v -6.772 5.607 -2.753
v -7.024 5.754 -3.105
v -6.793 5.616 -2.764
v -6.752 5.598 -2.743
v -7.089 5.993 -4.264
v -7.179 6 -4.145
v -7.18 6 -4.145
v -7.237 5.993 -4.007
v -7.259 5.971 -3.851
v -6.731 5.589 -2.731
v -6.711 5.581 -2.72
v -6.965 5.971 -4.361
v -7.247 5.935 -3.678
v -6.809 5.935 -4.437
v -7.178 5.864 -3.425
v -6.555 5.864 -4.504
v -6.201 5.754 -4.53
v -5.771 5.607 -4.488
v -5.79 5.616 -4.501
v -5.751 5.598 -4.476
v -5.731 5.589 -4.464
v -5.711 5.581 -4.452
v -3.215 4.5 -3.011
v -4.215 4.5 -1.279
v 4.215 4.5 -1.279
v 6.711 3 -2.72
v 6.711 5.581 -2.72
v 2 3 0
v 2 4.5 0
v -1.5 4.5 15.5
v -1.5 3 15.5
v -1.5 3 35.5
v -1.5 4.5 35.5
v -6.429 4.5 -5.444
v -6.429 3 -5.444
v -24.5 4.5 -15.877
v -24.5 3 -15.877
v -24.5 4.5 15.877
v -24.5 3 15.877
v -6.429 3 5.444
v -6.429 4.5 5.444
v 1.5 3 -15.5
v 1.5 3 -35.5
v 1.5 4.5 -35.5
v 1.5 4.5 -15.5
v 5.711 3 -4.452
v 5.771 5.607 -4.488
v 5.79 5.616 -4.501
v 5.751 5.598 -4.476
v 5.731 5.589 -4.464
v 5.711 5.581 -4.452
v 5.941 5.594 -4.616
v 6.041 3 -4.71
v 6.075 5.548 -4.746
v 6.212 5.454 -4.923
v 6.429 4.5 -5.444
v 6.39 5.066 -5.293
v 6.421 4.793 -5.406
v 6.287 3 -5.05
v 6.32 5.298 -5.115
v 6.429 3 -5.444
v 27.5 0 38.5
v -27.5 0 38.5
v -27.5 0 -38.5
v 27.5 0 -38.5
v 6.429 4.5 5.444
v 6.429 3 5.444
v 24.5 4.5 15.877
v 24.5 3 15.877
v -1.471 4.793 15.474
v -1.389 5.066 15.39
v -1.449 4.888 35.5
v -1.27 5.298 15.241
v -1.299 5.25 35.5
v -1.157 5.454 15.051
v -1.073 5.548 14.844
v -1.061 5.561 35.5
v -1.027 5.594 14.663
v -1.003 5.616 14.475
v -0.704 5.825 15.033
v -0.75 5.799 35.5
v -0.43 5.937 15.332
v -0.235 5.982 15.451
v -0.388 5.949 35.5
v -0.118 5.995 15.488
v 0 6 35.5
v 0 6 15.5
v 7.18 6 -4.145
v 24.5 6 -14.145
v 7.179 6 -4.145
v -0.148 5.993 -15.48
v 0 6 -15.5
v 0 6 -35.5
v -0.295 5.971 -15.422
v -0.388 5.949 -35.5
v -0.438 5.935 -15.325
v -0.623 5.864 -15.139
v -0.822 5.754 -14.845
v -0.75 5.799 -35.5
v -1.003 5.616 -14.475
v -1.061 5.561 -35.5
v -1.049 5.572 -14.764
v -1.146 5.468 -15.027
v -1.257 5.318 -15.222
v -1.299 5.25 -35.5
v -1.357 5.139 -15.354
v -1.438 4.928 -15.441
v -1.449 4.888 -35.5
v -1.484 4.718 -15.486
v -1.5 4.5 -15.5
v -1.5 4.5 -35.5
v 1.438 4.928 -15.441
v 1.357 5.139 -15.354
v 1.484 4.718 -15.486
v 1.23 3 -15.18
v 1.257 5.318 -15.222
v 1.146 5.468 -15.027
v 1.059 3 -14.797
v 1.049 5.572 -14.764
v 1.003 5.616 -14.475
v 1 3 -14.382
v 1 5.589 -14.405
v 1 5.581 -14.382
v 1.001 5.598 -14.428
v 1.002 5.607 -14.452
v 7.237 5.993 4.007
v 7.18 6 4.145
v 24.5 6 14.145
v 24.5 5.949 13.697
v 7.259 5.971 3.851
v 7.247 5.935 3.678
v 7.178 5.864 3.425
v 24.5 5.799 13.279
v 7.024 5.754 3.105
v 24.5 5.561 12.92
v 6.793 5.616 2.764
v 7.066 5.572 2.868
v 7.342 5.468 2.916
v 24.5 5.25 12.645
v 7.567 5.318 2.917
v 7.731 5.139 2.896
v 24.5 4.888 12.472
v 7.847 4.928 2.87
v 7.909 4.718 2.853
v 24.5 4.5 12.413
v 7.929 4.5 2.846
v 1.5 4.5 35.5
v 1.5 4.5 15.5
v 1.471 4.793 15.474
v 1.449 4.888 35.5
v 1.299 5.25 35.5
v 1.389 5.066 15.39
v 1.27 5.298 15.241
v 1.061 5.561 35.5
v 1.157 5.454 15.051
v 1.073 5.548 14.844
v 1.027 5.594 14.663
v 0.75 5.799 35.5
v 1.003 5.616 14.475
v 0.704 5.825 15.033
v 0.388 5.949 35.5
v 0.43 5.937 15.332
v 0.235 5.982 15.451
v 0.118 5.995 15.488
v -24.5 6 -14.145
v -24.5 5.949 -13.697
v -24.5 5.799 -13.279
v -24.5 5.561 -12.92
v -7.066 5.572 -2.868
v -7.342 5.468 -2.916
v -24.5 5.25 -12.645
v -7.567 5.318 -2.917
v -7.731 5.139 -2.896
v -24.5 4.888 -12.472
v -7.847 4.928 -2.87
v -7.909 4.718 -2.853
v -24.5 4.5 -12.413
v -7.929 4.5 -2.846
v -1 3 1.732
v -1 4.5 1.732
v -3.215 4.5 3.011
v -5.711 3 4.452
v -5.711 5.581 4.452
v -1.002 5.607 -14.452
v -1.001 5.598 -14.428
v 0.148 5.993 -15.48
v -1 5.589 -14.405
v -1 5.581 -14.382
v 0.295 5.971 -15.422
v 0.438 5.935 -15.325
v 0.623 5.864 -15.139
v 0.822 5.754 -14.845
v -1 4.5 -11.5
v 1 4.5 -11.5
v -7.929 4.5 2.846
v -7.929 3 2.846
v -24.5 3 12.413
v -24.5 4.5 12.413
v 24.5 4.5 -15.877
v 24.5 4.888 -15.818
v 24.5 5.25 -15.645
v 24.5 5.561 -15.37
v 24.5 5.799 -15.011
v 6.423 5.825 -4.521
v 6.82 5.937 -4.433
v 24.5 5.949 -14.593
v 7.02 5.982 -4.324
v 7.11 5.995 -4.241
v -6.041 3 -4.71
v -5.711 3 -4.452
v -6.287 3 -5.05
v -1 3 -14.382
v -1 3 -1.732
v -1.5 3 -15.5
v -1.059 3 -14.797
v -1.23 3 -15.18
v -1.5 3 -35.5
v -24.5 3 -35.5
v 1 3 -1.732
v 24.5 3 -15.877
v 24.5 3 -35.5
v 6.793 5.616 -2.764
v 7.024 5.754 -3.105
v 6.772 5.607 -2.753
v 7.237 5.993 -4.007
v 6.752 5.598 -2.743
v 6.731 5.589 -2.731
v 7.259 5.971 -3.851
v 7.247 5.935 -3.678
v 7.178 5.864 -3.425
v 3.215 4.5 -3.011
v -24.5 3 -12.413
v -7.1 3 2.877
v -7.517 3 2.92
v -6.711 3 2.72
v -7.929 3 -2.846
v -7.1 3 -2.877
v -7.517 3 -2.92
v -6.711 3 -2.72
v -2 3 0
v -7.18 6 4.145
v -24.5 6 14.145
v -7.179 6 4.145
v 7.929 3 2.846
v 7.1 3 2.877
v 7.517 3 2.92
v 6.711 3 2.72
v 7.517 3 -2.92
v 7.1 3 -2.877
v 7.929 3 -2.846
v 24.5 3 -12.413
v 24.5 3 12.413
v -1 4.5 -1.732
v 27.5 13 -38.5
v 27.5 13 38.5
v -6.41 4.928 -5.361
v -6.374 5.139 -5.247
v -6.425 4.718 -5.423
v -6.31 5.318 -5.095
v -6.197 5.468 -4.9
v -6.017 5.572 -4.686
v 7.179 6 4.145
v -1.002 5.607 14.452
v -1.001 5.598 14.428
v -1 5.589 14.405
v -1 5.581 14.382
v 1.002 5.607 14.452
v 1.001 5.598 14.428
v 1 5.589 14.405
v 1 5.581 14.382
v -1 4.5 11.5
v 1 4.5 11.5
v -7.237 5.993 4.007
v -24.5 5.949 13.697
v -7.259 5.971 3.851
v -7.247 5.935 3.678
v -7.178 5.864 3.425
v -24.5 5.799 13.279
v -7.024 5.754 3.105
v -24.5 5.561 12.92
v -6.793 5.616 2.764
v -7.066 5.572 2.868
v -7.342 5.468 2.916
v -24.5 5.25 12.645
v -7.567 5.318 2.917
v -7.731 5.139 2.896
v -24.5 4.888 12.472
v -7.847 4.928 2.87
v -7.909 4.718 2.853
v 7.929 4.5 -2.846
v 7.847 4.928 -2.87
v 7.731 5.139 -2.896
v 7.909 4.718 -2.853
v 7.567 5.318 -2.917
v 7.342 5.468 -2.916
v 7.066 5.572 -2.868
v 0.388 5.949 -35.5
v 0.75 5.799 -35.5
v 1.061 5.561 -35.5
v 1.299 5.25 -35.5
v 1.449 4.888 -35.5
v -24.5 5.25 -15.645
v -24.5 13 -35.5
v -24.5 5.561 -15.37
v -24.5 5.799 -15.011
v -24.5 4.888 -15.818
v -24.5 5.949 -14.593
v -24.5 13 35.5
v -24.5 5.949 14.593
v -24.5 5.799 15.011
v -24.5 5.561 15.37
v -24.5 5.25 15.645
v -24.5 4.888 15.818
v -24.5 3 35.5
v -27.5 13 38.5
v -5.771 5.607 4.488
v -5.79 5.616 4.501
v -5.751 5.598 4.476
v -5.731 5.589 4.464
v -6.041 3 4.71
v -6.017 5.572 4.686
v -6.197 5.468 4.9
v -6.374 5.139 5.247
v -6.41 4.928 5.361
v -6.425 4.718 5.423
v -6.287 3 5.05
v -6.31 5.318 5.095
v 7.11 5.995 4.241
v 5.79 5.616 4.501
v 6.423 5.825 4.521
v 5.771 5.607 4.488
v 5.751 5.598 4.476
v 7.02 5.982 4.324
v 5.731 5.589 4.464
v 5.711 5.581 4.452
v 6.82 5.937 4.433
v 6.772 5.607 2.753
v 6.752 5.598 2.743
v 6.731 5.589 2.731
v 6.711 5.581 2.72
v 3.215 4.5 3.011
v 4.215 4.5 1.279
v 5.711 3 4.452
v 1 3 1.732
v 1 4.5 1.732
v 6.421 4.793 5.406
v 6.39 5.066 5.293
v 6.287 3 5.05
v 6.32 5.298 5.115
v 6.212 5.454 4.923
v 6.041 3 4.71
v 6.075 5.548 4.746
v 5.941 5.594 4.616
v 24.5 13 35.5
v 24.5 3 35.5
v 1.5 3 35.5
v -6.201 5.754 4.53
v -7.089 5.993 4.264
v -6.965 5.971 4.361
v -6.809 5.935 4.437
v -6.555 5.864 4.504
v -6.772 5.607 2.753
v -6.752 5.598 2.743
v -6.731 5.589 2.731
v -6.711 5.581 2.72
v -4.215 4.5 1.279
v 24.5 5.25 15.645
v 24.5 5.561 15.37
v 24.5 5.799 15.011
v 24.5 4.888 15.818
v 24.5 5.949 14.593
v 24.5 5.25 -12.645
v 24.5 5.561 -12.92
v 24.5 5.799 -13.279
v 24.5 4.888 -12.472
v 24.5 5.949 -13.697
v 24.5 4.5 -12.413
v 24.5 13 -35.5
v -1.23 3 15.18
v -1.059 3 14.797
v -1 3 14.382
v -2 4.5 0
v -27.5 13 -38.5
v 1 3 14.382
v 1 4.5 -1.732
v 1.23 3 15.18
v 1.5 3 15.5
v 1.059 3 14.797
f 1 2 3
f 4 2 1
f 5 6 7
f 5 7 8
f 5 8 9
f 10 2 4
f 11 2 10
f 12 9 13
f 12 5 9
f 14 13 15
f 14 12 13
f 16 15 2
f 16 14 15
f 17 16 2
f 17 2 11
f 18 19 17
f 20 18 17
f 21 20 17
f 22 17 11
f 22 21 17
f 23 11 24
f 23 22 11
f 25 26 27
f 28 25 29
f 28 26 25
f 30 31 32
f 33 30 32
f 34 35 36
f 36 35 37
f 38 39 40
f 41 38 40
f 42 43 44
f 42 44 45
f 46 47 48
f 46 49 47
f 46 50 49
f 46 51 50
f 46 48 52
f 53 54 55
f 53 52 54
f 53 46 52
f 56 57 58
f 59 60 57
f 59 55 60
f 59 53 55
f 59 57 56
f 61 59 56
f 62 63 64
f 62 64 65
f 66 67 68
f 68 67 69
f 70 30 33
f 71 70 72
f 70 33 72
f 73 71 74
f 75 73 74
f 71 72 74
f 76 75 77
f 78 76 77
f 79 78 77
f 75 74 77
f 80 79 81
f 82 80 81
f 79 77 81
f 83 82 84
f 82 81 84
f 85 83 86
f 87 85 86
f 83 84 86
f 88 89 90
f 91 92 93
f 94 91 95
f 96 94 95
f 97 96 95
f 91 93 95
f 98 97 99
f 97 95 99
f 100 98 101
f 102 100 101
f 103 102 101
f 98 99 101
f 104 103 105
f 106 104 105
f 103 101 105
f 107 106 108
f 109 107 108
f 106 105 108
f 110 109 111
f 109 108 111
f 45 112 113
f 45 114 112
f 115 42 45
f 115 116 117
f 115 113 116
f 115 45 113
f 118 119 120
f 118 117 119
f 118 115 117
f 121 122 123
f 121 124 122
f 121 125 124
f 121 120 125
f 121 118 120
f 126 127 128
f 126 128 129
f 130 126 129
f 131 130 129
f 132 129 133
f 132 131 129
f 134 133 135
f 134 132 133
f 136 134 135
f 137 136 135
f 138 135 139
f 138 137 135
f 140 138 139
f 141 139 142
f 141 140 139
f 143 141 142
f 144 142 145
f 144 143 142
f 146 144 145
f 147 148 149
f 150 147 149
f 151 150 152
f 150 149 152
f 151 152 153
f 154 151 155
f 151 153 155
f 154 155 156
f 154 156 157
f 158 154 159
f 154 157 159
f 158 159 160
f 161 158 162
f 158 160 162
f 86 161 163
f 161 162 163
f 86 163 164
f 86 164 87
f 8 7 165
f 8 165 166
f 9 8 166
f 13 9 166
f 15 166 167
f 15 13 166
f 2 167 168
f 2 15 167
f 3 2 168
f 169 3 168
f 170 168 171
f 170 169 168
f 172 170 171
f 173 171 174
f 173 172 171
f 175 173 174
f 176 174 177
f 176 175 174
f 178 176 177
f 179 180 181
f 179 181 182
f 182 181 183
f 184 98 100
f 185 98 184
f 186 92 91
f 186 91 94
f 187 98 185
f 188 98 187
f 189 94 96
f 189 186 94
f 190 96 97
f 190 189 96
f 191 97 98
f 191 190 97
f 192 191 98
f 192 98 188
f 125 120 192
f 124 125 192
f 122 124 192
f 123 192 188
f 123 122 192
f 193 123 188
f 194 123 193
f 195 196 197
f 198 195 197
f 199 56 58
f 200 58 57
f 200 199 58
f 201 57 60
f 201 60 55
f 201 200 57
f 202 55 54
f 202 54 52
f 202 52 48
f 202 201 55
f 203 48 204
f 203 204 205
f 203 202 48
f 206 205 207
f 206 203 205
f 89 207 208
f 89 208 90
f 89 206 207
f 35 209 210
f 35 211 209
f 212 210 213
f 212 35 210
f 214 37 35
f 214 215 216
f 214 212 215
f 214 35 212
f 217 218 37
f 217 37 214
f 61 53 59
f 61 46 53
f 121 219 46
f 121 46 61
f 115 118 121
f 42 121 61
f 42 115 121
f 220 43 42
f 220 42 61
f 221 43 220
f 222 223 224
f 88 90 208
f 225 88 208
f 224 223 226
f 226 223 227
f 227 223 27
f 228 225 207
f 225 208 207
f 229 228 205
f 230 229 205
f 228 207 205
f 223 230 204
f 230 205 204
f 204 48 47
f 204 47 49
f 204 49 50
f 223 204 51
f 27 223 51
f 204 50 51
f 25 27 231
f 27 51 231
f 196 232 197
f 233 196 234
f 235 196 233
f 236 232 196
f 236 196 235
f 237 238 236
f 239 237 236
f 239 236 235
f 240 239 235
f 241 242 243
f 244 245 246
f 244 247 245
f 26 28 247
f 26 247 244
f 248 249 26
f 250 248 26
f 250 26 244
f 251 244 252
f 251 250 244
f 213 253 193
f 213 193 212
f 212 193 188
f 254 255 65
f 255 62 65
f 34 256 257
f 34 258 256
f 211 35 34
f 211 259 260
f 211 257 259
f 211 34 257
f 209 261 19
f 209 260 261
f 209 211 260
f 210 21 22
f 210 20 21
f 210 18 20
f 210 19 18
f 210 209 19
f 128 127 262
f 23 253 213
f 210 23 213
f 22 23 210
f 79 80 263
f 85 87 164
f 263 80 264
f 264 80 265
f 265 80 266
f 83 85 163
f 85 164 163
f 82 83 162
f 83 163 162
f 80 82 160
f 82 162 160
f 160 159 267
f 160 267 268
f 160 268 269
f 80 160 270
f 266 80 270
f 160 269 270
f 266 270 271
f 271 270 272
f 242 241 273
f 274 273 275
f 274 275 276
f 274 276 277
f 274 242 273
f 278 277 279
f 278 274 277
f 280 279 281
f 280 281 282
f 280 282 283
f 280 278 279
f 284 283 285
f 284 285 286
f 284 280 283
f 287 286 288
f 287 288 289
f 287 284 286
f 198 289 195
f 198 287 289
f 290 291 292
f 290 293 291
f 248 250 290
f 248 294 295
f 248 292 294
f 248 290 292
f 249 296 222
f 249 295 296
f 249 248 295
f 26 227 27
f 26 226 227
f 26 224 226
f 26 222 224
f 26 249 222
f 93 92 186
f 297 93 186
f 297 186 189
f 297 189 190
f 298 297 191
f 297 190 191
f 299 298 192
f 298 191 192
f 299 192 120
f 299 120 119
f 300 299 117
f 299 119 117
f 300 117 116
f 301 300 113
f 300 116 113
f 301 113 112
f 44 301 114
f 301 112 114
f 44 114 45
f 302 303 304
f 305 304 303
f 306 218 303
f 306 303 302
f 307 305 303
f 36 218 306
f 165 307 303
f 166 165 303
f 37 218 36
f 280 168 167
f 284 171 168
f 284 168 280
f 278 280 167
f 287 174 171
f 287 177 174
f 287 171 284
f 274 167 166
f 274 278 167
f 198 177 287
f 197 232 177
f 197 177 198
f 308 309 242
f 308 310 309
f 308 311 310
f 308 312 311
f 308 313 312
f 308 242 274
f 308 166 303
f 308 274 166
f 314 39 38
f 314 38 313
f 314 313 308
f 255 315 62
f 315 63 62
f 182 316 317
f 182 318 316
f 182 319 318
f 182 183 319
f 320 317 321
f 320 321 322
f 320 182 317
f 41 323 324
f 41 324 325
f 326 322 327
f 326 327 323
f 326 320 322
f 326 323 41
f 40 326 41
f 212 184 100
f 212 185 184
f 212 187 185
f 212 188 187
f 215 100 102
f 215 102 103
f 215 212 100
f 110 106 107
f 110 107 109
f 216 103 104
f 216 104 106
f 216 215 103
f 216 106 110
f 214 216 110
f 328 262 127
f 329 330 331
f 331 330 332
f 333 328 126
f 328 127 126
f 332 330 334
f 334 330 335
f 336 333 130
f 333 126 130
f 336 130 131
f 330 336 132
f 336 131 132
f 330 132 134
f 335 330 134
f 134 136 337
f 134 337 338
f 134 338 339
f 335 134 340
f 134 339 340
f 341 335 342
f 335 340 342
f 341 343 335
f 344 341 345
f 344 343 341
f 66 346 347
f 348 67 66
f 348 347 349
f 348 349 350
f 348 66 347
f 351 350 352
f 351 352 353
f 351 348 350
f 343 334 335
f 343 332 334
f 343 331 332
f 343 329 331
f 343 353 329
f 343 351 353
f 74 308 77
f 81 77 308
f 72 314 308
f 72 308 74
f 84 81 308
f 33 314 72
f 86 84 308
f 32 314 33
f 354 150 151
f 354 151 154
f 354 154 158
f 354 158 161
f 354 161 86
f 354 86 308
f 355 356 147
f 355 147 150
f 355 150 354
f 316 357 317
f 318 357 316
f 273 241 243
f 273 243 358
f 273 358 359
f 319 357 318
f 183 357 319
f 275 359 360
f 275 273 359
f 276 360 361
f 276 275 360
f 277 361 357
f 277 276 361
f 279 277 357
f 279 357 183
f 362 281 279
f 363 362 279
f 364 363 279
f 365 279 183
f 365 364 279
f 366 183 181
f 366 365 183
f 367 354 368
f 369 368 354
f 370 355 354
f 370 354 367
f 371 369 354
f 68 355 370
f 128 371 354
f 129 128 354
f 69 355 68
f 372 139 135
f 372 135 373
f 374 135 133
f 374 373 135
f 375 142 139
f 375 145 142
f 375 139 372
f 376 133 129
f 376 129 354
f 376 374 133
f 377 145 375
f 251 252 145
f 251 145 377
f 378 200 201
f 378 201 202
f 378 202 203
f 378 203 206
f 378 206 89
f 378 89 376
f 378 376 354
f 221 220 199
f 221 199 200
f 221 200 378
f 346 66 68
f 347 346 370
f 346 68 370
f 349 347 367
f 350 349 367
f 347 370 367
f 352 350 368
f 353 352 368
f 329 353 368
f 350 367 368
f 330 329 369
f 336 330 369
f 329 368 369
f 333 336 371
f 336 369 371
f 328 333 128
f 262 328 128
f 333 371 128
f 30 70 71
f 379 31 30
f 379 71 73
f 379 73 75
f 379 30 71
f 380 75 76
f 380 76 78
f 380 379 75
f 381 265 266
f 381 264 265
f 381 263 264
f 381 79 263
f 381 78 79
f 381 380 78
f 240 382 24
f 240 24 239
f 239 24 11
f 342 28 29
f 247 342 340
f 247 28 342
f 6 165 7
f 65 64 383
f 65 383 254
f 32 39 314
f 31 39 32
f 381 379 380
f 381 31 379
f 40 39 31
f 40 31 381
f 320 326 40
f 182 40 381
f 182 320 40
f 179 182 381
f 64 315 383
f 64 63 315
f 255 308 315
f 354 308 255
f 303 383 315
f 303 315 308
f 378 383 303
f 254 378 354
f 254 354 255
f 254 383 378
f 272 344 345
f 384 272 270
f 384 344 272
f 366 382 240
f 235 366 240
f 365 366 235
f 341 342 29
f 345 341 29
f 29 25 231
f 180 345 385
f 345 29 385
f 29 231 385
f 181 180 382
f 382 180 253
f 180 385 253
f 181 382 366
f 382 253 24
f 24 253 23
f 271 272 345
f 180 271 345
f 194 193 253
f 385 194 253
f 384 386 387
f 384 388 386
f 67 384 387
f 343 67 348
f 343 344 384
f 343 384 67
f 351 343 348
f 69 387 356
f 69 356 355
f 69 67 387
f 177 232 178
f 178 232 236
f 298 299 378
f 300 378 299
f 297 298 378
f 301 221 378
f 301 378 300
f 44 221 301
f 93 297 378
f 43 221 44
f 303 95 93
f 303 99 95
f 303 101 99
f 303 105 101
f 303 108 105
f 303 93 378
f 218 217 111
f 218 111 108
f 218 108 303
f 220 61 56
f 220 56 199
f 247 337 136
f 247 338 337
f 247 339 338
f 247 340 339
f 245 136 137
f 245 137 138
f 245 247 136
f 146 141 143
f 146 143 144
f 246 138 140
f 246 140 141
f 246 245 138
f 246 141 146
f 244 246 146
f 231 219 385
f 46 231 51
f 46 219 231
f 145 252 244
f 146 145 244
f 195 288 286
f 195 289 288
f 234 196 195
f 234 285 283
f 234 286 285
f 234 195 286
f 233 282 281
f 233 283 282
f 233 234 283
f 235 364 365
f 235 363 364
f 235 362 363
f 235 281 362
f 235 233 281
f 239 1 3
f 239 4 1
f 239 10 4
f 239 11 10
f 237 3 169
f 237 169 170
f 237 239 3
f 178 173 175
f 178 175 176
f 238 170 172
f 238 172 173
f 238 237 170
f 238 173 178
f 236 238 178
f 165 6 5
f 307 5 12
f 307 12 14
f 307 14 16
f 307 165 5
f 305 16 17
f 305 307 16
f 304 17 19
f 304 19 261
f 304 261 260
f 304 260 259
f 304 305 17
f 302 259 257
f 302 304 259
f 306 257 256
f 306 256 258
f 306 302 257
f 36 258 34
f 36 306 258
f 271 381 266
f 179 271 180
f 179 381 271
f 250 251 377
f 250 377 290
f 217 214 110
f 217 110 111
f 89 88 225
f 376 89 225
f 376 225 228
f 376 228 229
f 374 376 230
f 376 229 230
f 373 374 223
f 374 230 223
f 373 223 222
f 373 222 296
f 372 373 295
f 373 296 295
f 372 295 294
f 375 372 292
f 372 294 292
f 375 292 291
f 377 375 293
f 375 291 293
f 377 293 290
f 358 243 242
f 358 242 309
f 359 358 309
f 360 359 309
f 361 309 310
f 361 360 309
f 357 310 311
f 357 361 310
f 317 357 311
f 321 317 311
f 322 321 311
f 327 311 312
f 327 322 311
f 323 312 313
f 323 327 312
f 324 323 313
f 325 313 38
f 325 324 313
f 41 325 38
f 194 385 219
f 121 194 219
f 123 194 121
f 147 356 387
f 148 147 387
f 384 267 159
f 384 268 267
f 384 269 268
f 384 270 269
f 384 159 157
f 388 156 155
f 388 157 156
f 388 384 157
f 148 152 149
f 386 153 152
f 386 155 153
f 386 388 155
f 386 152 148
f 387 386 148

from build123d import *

# Parameters (mm, degrees)
ESQUISSE1_W        = 55
ESQUISSE1_H        = 77
BOSS_EXTRU_1_DEPTH = 3
ESQUISSE2_W        = 55
ESQUISSE2_H        = 77
BOSS_EXTRU_2_DEPTH = 10
BOSS_EXTRU_5_DEPTH = 1.5
BOSS_EXTRU_6_DEPTH = 3
BOSS_EXTRU_7_DEPTH = 2
BOSS_EXTRU_8_DEPTH = 2
BOSS_EXTRU_9_DEPTH = 2
CONG_3_R           = 1.5
CONG_4_R           = 1.5


# Some blends are built 0.0001 mm under size
with BuildPart() as part:
    # Esquisse1 → Boss.-Extru.1 (new body)
    with BuildSketch(Plane(origin=(0, 0, 0), x_dir=(1, 0, 0), z_dir=(0, 1, 0))):
        Rectangle(ESQUISSE1_W, ESQUISSE1_H)
    extrude(amount=BOSS_EXTRU_1_DEPTH)

    # Esquisse2 → Boss.-Extru.2 (add)
    with BuildSketch(Plane(origin=(0, 3, 0), x_dir=(1, 0, 0), z_dir=(0, 1, 0))):
        Rectangle(ESQUISSE2_W, ESQUISSE2_H)
        Polygon((-24.499999999999993, 35.50000000000001), (-24.499999999999982, -35.49999999999999), (24.500000000000007, -35.49999999999999), (24.499999999999993, 35.50000000000001), align=None, mode=Mode.SUBTRACT)
    extrude(amount=BOSS_EXTRU_2_DEPTH)

    # Esquisse3 → Boss.-Extru.5 (add)
    with BuildSketch(Plane(origin=(0, 3, 0), x_dir=(1, 0, 0), z_dir=(0, 1, 0))):
        Polygon((-1.0000000000000002, -35.500000000000014), (-1.000000000000001, -1.7320508075692145), (-25.4807621135329, -15.866025403784949), (-26.480762113533657, -14.133974596214742), (-2.000000000001547, 2.4e-16), (-26.480762113533604, 14.133974596214733), (-25.48076211353285, 15.866025403784942), (-1.0000000000003295, 1.7320508075699388), (-1.0000000000000002, 35.5), (0.9999999999999998, 35.5), (1.0000000000000004, 1.73205080756975), (25.48076211353284, 15.866025403784917), (26.4807621135336, 14.133974596214713), (2.0000000000011395, 2.3766e-13), (26.480762113533643, -14.133974596214754), (25.480762113532894, -15.86602540378496), (1.0000000000000002, -1.732050807569746), (0.9999999999999998, -35.500000000000014), align=None)
    extrude(amount=BOSS_EXTRU_5_DEPTH)

    # Esquisse4 → Boss.-Extru.6 (add)
    with BuildSketch(Plane(origin=(0, 3, 0), x_dir=(1, 0, 0), z_dir=(0, 1, 0))):
        Polygon((-7.929491924311156, -2.8460434894690736), (-26.335106973446237, -13.472530292687704), (-24.835106973446255, -16.070606504041027), (-6.429491924311169, -5.444119700822397), align=None)
        Polygon((1.4999999999999996, 35.50000000000001), (1.5000000000000027, 15.500000000000004), (-1.4999999999999978, 15.500000000000004), (-1.4999999999999996, 35.50000000000001), align=None)
        Polygon((-7.929491924311157, 2.846043489469073), (-6.429491924311172, 5.444119700822394), (-24.835106973446262, 16.070606504041017), (-26.33510697344624, 13.472530292687692), align=None)
        Polygon((7.929491924311156, 2.8460434894690683), (6.429491924311175, 5.44411970082239), (24.835106973446265, 16.070606504041002), (26.335106973446248, 13.47253029268768), align=None)
        Polygon((6.429491924311165, -5.444119700822401), (24.835106973446248, -16.07060650404104), (26.33510697344623, -13.472530292687718), (7.929491924311156, -2.846043489469078), align=None)
        Polygon((1.5000000000000113, -15.500000000000004), (-1.4999999999999891, -15.500000000000004), (-1.4999999999999796, -35.50000000000001), (1.5000000000000195, -35.50000000000001), align=None)
    extrude(amount=BOSS_EXTRU_6_DEPTH)

    # Esquisse5 → Boss.-Extru.7 (add)
    with BuildSketch(Plane(origin=(1.0000000000000004, 0, -2e-17), x_dir=(-2e-17, 0, -1), z_dir=(1, 0, -2e-17))):
        Polygon((15.500000000000004, 4.500000000000001), (15.500000000000004, 6), (11.500000000000004, 4.500000000000001), align=None)
        Polygon((-15.500000000000004, 4.500000000000001), (-15.500000000000004, 6), (-11.500000000000004, 4.500000000000001), align=None)
    extrude(amount=-BOSS_EXTRU_7_DEPTH)

    # Esquisse6 → Boss.-Extru.8 (add)
    with BuildSketch(Plane(origin=(0.5000000000003775, 0, -0.8660254037851042), x_dir=(-0.8660254037844415, 0, -0.4999999999999951), z_dir=(0.4999999999999951, 0, -0.8660254037844415))):
        Polygon((8.29016319029156, 4.500000000000001), (8.29016319029156, 6), (4.29016319029156, 4.500000000000001), align=None)
        Polygon((-8.290163190291564, 4.500000000000001), (-8.290163190291564, 6), (-4.290163190291564, 4.500000000000001), align=None)
    extrude(amount=-BOSS_EXTRU_8_DEPTH)

    # Esquisse7 → Boss.-Extru.9 (add)
    with BuildSketch(Plane(origin=(-0.5000000000003755, 0, -0.8660254037851022), x_dir=(-0.8660254037844419, 0, 0.4999999999999942), z_dir=(-0.4999999999999943, 0, -0.866025403784442))):
        Polygon((8.29016319029156, 4.500000000000001), (8.29016319029156, 6), (4.29016319029156, 4.500000000000001), align=None)
        Polygon((-8.290163190291565, 4.500000000000001), (-8.290163190291565, 6), (-4.290163190291565, 4.500000000000001), align=None)
    extrude(amount=-BOSS_EXTRU_9_DEPTH)

    # Congé3
    # the kernel refuses this fillet: 1.5 mm, written as the material it adds along each edge
    with BuildSketch(Plane(origin=(7.679491924311542, 0.20491502812697915, 3.279056191360634), x_dir=(-0.8660254037844417, 0, -0.4999999999999947), z_dir=(3e-16, 1, 1.04e-15))) as cong_3_piece_1_section:
        with BuildLine():
            CenterArc((1.1180339887492077, -1.5), CONG_3_R, 90, 48.189685104182075)
            Line((-1.03e-15, -0.49999999999923256), (-0.02236067977498537, -0.47999999999921733))
            ThreePointArc((-0.02236067977498537, -0.47999999999921733), (-0.02999999999999965, -0.2499999999996152), (-0.02999999999999979, 4.5e-16))
            Line((-0.02999999999999979, 4.5e-16), (-1.6e-16, 0.02999999999999995))
            Line((-1.6e-16, 0.02999999999999995), (1.1180339887492075, 0.02999999999999995))
            Line((1.1180339887492075, 0.02999999999999995), (1.1180339887492077, -2e-17))
        make_face()
    cong_3_piece_1 = extrude(amount=5.79508497187302, mode=Mode.PRIVATE)
    cong_3_piece_1 = split(cong_3_piece_1, bisect_by=Plane(origin=(6.26635238214522, 5.3609166378917985, 2.318241078666916), z_dir=(0.30408182027976954, -0.9363291775690448, 0.17556172079419408)), keep=Keep.TOP, mode=Mode.PRIVATE)
    add(cong_3_piece_1)
    with BuildSketch(Plane(origin=(6.679491924310785, 0.20491502812694629, 5.011106998930838), x_dir=(-0.8660254037844417, 1.8491723322253147e-15, -0.49999999999999484), z_dir=(2.558e-13, 1, -4.3935e-13))) as cong_3_piece_2_section:
        with BuildLine():
            CenterArc((1.1180339887492197, 1.5000000000000004), CONG_3_R, 221.81031489581747, 48.1896851041825)
            Line((3.04e-15, 0.4999999999992415), (-0.02236067977498087, 0.47999999999922616))
            ThreePointArc((-0.02236067977498087, 0.47999999999922616), (-0.02999999999999789, 0.24999999999962141), (-0.02999999999999957, 6e-17))
            Line((-0.02999999999999957, 6e-17), (-6e-17, -0.02999999999999957))
            Line((-6e-17, -0.02999999999999957), (1.118033988749219, -0.02999999999999961))
            Line((1.118033988749219, -0.02999999999999961), (1.1180339887492192, -3e-17))
        make_face()
    cong_3_piece_2 = extrude(amount=5.795084971873054, mode=Mode.PRIVATE)
    cong_3_piece_2 = split(cong_3_piece_2, bisect_by=Plane(origin=(5.140831857295212, 5.360916637891802, 4.267699812668763), z_dir=(0.30408182027976954, -0.9363291775690448, 0.17556172079419408)), keep=Keep.TOP, mode=Mode.PRIVATE)
    add(cong_3_piece_2)
    with BuildSketch(Plane(origin=(6.679491924310787, 0.2049150281269747, -5.011106998930838), x_dir=(-0.8660254037844415, 2.4159205118947413e-15, 0.49999999999999484), z_dir=(2.96e-15, 1, 3e-16))) as cong_3_piece_3_section:
        with BuildLine():
            CenterArc((1.118033988749203, -1.5), CONG_3_R, 89.99999999999994, 48.18968510418185)
            Line((-1.5e-16, -0.4999999999992273), (-0.02236067977498403, -0.47999999999921195))
            ThreePointArc((-0.02236067977498403, -0.47999999999921195), (-0.0299999999999991, -0.24999999999961453), (-0.02999999999999956, -6e-17))
            Line((-0.02999999999999956, -6e-17), (-6e-17, 0.02999999999999956))
            Line((-6e-17, 0.02999999999999956), (1.1180339887492046, 0.02999999999999955))
            Line((1.1180339887492046, 0.02999999999999955), (1.1180339887492046, -3e-17))
        make_face()
    cong_3_piece_3 = extrude(amount=5.795084971873026, mode=Mode.PRIVATE)
    cong_3_piece_3 = split(cong_3_piece_3, bisect_by=Plane(origin=(5.140831857294852, 5.360916637891798, -4.26769981266937), z_dir=(0.30408182027976965, -0.9363291775690445, -0.17556172079419374)), keep=Keep.TOP, mode=Mode.PRIVATE)
    add(cong_3_piece_3)
    with BuildSketch(Plane(origin=(7.679491924311382, 0.20491502812626994, -3.279056191360903), x_dir=(0.49999999999999595, 4.028111296295061e-13, 0.866025403784441), z_dir=(-1.9925e-13, 1, -3.5009e-13))) as cong_3_piece_4_section:
        with BuildLine():
            CenterArc((1.4999999999999813, -1.1180339887495117), CONG_3_R, 131.81031489580056, 48.18968510419856)
            Line((-1.912e-14, -1.118033988749488), (-0.03000000000001908, -1.1180339887494877))
            Line((-0.03000000000001908, -1.1180339887494877), (-0.02999999999999995, 2e-16))
            Line((-0.02999999999999995, 2e-16), (-2e-17, 0.02999999999999957))
            ThreePointArc((-2e-17, 0.02999999999999957), (0.24999999999977643, 0.02999999999999957), (0.479999999999544, 0.02236067977498998))
            Line((0.479999999999544, 0.02236067977498998), (0.4999999999995529, 1e-17))
        make_face()
    cong_3_piece_4 = extrude(amount=5.79508497187373, mode=Mode.PRIVATE)
    cong_3_piece_4 = split(cong_3_piece_4, bisect_by=Plane(origin=(6.26635238214469, 5.360916637891739, -2.3182410786675236), z_dir=(0.30408182027976965, -0.9363291775690445, -0.17556172079419374)), keep=Keep.TOP, mode=Mode.PRIVATE)
    add(cong_3_piece_4)
    with BuildSketch(Plane(origin=(-1.0000000000001952, 0.2049150281256935, -15.500000000000004), x_dir=(-9.73e-15, 0, 1), z_dir=(6.517e-14, 1, 0))) as cong_3_piece_5_section:
        with BuildLine():
            CenterArc((1.118033988749723, -1.5), CONG_3_R, 90.00000000000003, 48.189685104211264)
            Line((4.87e-15, -0.4999999999998024), (-0.02236067977498978, -0.47999999999979837))
            ThreePointArc((-0.02236067977498978, -0.47999999999979837), (-0.02999999999999693, -0.2499999999999015), (-0.02999999999999936, -2.9e-16))
            Line((-0.02999999999999936, -2.9e-16), (-2.9e-16, 0.03000000000000003))
            Line((-2.9e-16, 0.03000000000000003), (1.1180339887497224, 0.03000000000000003))
            Line((1.1180339887497224, 0.03000000000000003), (1.1180339887497226, 0))
        make_face()
    cong_3_piece_5 = extrude(amount=5.7950849718743065, mode=Mode.PRIVATE)
    cong_3_piece_5 = split(cong_3_piece_5, bisect_by=Plane(origin=(-1.1255205248498867, 5.36091663789169, -13.79577770104451), z_dir=(0, -0.9363291775690445, -0.35112344158839154)), keep=Keep.TOP, mode=Mode.PRIVATE)
    add(cong_3_piece_5)
    with BuildSketch(Plane(origin=(1.0000000000000002, 0.2049150281252583, -15.500000000000004), x_dir=(-2e-16, 0, 1), z_dir=(0, 1, 0))) as cong_3_piece_6_section:
        with BuildLine():
            CenterArc((1.1180339887498965, 1.5), CONG_3_R, 221.81031489577848, 48.18968510422155)
            Line((-1e-16, 0.5000000000000022), (-0.0223606797749981, 0.4800000000000022))
            ThreePointArc((-0.0223606797749981, 0.4800000000000022), (-0.02999999999999941, 0.2500000000000011), (-0.02999999999999936, -1e-17))
            Line((-0.02999999999999936, -1e-17), (1e-17, -0.03000000000000003))
            Line((1e-17, -0.03000000000000003), (1.1180339887498967, -0.03000000000000003))
            Line((1.1180339887498967, -0.03000000000000003), (1.1180339887498967, 0))
        make_face()
    cong_3_piece_6 = extrude(amount=5.795084971874742, mode=Mode.PRIVATE)
    cong_3_piece_6 = split(cong_3_piece_6, bisect_by=Plane(origin=(1.1255205248498363, 5.360916637891653, -13.795777701044411), z_dir=(0, -0.9363291775690445, -0.35112344158839154)), keep=Keep.TOP, mode=Mode.PRIVATE)
    add(cong_3_piece_6)
    with BuildSketch(Plane(origin=(-7.67949192431154, 0.20491502812696538, -3.2790561913606355), x_dir=(0.8660254037844416, 0, 0.49999999999999506), z_dir=(2.552e-13, 1, -4.4157e-13))) as cong_3_piece_7_section:
        with BuildLine():
            CenterArc((1.1180339887492157, -1.5), CONG_3_R, 90.00000000000003, 48.189685104182416)
            Line((3.9e-16, -0.4999999999992401), (-0.02236067977498396, -0.4799999999992249))
            ThreePointArc((-0.02236067977498396, -0.4799999999992249), (-0.02999999999999911, -0.24999999999961958), (-0.02999999999999957, 6e-17))
            Line((-0.02999999999999957, 6e-17), (-1.7e-16, 0.02999999999999995))
            Line((-1.7e-16, 0.02999999999999995), (1.118033988749215, 0.02999999999999993))
            Line((1.118033988749215, 0.02999999999999993), (1.1180339887492152, 2e-17))
        make_face()
    cong_3_piece_7 = extrude(amount=5.795084971873035, mode=Mode.PRIVATE)
    cong_3_piece_7 = split(cong_3_piece_7, bisect_by=Plane(origin=(-6.266352382144866, 5.360916637891801, -2.318241078667536), z_dir=(-0.30408182027976954, -0.9363291775690448, -0.17556172079419408)), keep=Keep.TOP, mode=Mode.PRIVATE)
    add(cong_3_piece_7)
    with BuildSketch(Plane(origin=(-6.679491924310783, 0.20491502812699558, -5.011106998930843), x_dir=(0.49999999999999273, 0, -0.8660254037844428), z_dir=(-5.9e-16, 1, -3e-16))) as cong_3_piece_8_section:
        with BuildLine():
            CenterArc((1.4999999999999964, -1.1180339887492052), CONG_3_R, 131.8103148958181, 48.18968510418176)
            Line((-3.77e-15, -1.1180339887492012), (-0.03000000000000333, -1.118033988749201))
            Line((-0.03000000000000333, -1.118033988749201), (-0.02999999999999956, 1.3e-16))
            Line((-0.02999999999999956, 1.3e-16), (1.3e-16, 0.02999999999999957))
            ThreePointArc((1.3e-16, 0.02999999999999957), (0.2499999999996134, 0.0299999999999988), (0.4799999999992104, 0.02236067977498394))
            Line((0.4799999999992104, 0.02236067977498394), (0.4999999999992257, 2e-17))
        make_face()
    cong_3_piece_8 = extrude(amount=5.795084971873004, mode=Mode.PRIVATE)
    cong_3_piece_8 = split(cong_3_piece_8, bisect_by=Plane(origin=(-5.140831857294851, 5.3609166378918, -4.267699812669376), z_dir=(-0.30408182027976954, -0.9363291775690448, -0.17556172079419408)), keep=Keep.TOP, mode=Mode.PRIVATE)
    add(cong_3_piece_8)
    with BuildSketch(Plane(origin=(1, 0.2049150281252361, 15.500000000000004), x_dir=(0, 0, -1), z_dir=(2.2e-16, 1, 0))) as cong_3_piece_9_section:
        with BuildLine():
            CenterArc((1.1180339887499056, -1.5), CONG_3_R, 90, 48.18968510422201)
            Line((0, -0.5000000000000115), (-0.022360679774998, -0.48000000000001175))
            ThreePointArc((-0.022360679774998, -0.48000000000001175), (-0.02999999999999936, -0.2500000000000058), (-0.02999999999999936, 0))
            Line((-0.02999999999999936, 0), (0, 0.03000000000000003))
            Line((0, 0.03000000000000003), (1.1180339887499056, 0.03000000000000003))
            Line((1.1180339887499056, 0.03000000000000003), (1.1180339887499056, 0))
        make_face()
    cong_3_piece_9 = extrude(amount=5.795084971874764, mode=Mode.PRIVATE)
    cong_3_piece_9 = split(cong_3_piece_9, bisect_by=Plane(origin=(1.1255205248498388, 5.360916637891652, 13.795777701044408), z_dir=(0, -0.9363291775690445, 0.35112344158839154)), keep=Keep.TOP, mode=Mode.PRIVATE)
    add(cong_3_piece_9)
    with BuildSketch(Plane(origin=(-1.0000000000000007, 0.20491502812529383, 15.500000000000004), x_dir=(-2e-16, 0, -1), z_dir=(4.8e-16, 1, 0))) as cong_3_piece_10_section:
        with BuildLine():
            CenterArc((1.1180339887498827, 1.5), CONG_3_R, 221.81031489577921, 48.18968510422076)
            Line((-1.68e-15, 0.49999999999998757), (-0.02236067977499969, 0.4799999999999873))
            ThreePointArc((-0.02236067977499969, 0.4799999999999873), (-0.02999999999999931, 0.24999999999999378), (-0.02999999999999936, 1e-17))
            Line((-0.02999999999999936, 1e-17), (-1e-17, -0.03000000000000003))
            Line((-1e-17, -0.03000000000000003), (1.1180339887498825, -0.03000000000000003))
            Line((1.1180339887498825, -0.03000000000000003), (1.1180339887498825, 0))
        make_face()
    cong_3_piece_10 = extrude(amount=5.795084971874706, mode=Mode.PRIVATE)
    cong_3_piece_10 = split(cong_3_piece_10, bisect_by=Plane(origin=(-1.1255205248498321, 5.360916637891656, 13.79577770104442), z_dir=(0, -0.9363291775690445, 0.35112344158839154)), keep=Keep.TOP, mode=Mode.PRIVATE)
    add(cong_3_piece_10)
    with BuildSketch(Plane(origin=(-6.679491924310963, 0.20491502812617934, 5.011106998930529), x_dir=(0.8660254037844338, 1.4527323097483483e-15, -0.5000000000000083), z_dir=(-1.9688e-13, 1, -3.381e-13))) as cong_3_piece_11_section:
        with BuildLine():
            CenterArc((1.1180339887495254, -1.4999999999999998), CONG_3_R, 90.00000000000006, 48.18968510420052)
            Line((-6.02e-15, -0.49999999999959355), (-0.02236067977499678, -0.479999999999585))
            ThreePointArc((-0.02236067977499678, -0.479999999999585), (-0.0300000000000028, -0.24999999999979675), (-0.02999999999999956, 4.1e-16))
            Line((-0.02999999999999956, 4.1e-16), (-3.6e-16, 0.03000000000000001))
            Line((-3.6e-16, 0.03000000000000001), (1.118033988749524, 0.03000000000000005))
            Line((1.118033988749524, 0.03000000000000005), (1.1180339887495243, 5e-17))
        make_face()
    cong_3_piece_11 = extrude(amount=5.795084971873821, mode=Mode.PRIVATE)
    cong_3_piece_11 = split(cong_3_piece_11, bisect_by=Plane(origin=(-5.140831857295105, 5.360916637891735, 4.267699812668589), z_dir=(-0.30408182027976965, -0.9363291775690445, 0.17556172079419374)), keep=Keep.TOP, mode=Mode.PRIVATE)
    add(cong_3_piece_11)
    with BuildSketch(Plane(origin=(-7.679491924311542, 0.20491502812697604, 3.279056191360633), x_dir=(0.8660254037844413, 0, -0.4999999999999951), z_dir=(-8.9e-16, 1, 1.5e-16))) as cong_3_piece_12_section:
        with BuildLine():
            CenterArc((1.1180339887492128, 1.4999999999999998), CONG_3_R, 221.81031489581775, 48.18968510418216)
            Line((1.24e-15, 0.49999999999923594), (-0.02236067977498311, 0.4799999999992207))
            ThreePointArc((-0.02236067977498311, 0.4799999999992207), (-0.02999999999999849, 0.2499999999996187), (-0.02999999999999956, -5e-17))
            Line((-0.02999999999999956, -5e-17), (-1.7e-16, -0.02999999999999994))
            Line((-1.7e-16, -0.02999999999999994), (1.1180339887492108, -0.02999999999999993))
            Line((1.1180339887492108, -0.02999999999999993), (1.118033988749211, -2e-17))
        make_face()
    cong_3_piece_12 = extrude(amount=5.795084971873024, mode=Mode.PRIVATE)
    cong_3_piece_12 = split(cong_3_piece_12, bisect_by=Plane(origin=(-6.26635238214522, 5.3609166378917985, 2.3182410786669125), z_dir=(-0.30408182027976965, -0.9363291775690445, 0.17556172079419374)), keep=Keep.TOP, mode=Mode.PRIVATE)
    add(cong_3_piece_12)

    # Congé4
    cong_4_edges = [part.edges().sort_by_distance(p)[0] for p in [
        (-1.4999999999999987, 6, -25.500000000000007),
        (1.500000000000001, 6, -25.500000000000007),
        (15.464745962155586, 6, -10.660626051768435),
        (16.214745962155575, 6, -7.629537138522904),
        (16.214745962155583, 6, 7.629537138522935),
        (15.464745962155583, 6, 10.660626051768467),
        (1.5000000000000155, 6, 25.500000000000007),
        (-1.4999999999999845, 6, 25.500000000000007),
        (-15.464745962155579, 6, 10.660626051768453),
        (-16.214745962155572, 6, 7.62953713852292),
        (-16.214745962155575, 6, -7.629537138522914),
        (-15.46474596215558, 6, -10.660626051768443),
    ]]
    fillet(cong_4_edges, radius=CONG_4_R - 0.0001)  # a hair under: the kernel refuses the full size


solid = part.part
